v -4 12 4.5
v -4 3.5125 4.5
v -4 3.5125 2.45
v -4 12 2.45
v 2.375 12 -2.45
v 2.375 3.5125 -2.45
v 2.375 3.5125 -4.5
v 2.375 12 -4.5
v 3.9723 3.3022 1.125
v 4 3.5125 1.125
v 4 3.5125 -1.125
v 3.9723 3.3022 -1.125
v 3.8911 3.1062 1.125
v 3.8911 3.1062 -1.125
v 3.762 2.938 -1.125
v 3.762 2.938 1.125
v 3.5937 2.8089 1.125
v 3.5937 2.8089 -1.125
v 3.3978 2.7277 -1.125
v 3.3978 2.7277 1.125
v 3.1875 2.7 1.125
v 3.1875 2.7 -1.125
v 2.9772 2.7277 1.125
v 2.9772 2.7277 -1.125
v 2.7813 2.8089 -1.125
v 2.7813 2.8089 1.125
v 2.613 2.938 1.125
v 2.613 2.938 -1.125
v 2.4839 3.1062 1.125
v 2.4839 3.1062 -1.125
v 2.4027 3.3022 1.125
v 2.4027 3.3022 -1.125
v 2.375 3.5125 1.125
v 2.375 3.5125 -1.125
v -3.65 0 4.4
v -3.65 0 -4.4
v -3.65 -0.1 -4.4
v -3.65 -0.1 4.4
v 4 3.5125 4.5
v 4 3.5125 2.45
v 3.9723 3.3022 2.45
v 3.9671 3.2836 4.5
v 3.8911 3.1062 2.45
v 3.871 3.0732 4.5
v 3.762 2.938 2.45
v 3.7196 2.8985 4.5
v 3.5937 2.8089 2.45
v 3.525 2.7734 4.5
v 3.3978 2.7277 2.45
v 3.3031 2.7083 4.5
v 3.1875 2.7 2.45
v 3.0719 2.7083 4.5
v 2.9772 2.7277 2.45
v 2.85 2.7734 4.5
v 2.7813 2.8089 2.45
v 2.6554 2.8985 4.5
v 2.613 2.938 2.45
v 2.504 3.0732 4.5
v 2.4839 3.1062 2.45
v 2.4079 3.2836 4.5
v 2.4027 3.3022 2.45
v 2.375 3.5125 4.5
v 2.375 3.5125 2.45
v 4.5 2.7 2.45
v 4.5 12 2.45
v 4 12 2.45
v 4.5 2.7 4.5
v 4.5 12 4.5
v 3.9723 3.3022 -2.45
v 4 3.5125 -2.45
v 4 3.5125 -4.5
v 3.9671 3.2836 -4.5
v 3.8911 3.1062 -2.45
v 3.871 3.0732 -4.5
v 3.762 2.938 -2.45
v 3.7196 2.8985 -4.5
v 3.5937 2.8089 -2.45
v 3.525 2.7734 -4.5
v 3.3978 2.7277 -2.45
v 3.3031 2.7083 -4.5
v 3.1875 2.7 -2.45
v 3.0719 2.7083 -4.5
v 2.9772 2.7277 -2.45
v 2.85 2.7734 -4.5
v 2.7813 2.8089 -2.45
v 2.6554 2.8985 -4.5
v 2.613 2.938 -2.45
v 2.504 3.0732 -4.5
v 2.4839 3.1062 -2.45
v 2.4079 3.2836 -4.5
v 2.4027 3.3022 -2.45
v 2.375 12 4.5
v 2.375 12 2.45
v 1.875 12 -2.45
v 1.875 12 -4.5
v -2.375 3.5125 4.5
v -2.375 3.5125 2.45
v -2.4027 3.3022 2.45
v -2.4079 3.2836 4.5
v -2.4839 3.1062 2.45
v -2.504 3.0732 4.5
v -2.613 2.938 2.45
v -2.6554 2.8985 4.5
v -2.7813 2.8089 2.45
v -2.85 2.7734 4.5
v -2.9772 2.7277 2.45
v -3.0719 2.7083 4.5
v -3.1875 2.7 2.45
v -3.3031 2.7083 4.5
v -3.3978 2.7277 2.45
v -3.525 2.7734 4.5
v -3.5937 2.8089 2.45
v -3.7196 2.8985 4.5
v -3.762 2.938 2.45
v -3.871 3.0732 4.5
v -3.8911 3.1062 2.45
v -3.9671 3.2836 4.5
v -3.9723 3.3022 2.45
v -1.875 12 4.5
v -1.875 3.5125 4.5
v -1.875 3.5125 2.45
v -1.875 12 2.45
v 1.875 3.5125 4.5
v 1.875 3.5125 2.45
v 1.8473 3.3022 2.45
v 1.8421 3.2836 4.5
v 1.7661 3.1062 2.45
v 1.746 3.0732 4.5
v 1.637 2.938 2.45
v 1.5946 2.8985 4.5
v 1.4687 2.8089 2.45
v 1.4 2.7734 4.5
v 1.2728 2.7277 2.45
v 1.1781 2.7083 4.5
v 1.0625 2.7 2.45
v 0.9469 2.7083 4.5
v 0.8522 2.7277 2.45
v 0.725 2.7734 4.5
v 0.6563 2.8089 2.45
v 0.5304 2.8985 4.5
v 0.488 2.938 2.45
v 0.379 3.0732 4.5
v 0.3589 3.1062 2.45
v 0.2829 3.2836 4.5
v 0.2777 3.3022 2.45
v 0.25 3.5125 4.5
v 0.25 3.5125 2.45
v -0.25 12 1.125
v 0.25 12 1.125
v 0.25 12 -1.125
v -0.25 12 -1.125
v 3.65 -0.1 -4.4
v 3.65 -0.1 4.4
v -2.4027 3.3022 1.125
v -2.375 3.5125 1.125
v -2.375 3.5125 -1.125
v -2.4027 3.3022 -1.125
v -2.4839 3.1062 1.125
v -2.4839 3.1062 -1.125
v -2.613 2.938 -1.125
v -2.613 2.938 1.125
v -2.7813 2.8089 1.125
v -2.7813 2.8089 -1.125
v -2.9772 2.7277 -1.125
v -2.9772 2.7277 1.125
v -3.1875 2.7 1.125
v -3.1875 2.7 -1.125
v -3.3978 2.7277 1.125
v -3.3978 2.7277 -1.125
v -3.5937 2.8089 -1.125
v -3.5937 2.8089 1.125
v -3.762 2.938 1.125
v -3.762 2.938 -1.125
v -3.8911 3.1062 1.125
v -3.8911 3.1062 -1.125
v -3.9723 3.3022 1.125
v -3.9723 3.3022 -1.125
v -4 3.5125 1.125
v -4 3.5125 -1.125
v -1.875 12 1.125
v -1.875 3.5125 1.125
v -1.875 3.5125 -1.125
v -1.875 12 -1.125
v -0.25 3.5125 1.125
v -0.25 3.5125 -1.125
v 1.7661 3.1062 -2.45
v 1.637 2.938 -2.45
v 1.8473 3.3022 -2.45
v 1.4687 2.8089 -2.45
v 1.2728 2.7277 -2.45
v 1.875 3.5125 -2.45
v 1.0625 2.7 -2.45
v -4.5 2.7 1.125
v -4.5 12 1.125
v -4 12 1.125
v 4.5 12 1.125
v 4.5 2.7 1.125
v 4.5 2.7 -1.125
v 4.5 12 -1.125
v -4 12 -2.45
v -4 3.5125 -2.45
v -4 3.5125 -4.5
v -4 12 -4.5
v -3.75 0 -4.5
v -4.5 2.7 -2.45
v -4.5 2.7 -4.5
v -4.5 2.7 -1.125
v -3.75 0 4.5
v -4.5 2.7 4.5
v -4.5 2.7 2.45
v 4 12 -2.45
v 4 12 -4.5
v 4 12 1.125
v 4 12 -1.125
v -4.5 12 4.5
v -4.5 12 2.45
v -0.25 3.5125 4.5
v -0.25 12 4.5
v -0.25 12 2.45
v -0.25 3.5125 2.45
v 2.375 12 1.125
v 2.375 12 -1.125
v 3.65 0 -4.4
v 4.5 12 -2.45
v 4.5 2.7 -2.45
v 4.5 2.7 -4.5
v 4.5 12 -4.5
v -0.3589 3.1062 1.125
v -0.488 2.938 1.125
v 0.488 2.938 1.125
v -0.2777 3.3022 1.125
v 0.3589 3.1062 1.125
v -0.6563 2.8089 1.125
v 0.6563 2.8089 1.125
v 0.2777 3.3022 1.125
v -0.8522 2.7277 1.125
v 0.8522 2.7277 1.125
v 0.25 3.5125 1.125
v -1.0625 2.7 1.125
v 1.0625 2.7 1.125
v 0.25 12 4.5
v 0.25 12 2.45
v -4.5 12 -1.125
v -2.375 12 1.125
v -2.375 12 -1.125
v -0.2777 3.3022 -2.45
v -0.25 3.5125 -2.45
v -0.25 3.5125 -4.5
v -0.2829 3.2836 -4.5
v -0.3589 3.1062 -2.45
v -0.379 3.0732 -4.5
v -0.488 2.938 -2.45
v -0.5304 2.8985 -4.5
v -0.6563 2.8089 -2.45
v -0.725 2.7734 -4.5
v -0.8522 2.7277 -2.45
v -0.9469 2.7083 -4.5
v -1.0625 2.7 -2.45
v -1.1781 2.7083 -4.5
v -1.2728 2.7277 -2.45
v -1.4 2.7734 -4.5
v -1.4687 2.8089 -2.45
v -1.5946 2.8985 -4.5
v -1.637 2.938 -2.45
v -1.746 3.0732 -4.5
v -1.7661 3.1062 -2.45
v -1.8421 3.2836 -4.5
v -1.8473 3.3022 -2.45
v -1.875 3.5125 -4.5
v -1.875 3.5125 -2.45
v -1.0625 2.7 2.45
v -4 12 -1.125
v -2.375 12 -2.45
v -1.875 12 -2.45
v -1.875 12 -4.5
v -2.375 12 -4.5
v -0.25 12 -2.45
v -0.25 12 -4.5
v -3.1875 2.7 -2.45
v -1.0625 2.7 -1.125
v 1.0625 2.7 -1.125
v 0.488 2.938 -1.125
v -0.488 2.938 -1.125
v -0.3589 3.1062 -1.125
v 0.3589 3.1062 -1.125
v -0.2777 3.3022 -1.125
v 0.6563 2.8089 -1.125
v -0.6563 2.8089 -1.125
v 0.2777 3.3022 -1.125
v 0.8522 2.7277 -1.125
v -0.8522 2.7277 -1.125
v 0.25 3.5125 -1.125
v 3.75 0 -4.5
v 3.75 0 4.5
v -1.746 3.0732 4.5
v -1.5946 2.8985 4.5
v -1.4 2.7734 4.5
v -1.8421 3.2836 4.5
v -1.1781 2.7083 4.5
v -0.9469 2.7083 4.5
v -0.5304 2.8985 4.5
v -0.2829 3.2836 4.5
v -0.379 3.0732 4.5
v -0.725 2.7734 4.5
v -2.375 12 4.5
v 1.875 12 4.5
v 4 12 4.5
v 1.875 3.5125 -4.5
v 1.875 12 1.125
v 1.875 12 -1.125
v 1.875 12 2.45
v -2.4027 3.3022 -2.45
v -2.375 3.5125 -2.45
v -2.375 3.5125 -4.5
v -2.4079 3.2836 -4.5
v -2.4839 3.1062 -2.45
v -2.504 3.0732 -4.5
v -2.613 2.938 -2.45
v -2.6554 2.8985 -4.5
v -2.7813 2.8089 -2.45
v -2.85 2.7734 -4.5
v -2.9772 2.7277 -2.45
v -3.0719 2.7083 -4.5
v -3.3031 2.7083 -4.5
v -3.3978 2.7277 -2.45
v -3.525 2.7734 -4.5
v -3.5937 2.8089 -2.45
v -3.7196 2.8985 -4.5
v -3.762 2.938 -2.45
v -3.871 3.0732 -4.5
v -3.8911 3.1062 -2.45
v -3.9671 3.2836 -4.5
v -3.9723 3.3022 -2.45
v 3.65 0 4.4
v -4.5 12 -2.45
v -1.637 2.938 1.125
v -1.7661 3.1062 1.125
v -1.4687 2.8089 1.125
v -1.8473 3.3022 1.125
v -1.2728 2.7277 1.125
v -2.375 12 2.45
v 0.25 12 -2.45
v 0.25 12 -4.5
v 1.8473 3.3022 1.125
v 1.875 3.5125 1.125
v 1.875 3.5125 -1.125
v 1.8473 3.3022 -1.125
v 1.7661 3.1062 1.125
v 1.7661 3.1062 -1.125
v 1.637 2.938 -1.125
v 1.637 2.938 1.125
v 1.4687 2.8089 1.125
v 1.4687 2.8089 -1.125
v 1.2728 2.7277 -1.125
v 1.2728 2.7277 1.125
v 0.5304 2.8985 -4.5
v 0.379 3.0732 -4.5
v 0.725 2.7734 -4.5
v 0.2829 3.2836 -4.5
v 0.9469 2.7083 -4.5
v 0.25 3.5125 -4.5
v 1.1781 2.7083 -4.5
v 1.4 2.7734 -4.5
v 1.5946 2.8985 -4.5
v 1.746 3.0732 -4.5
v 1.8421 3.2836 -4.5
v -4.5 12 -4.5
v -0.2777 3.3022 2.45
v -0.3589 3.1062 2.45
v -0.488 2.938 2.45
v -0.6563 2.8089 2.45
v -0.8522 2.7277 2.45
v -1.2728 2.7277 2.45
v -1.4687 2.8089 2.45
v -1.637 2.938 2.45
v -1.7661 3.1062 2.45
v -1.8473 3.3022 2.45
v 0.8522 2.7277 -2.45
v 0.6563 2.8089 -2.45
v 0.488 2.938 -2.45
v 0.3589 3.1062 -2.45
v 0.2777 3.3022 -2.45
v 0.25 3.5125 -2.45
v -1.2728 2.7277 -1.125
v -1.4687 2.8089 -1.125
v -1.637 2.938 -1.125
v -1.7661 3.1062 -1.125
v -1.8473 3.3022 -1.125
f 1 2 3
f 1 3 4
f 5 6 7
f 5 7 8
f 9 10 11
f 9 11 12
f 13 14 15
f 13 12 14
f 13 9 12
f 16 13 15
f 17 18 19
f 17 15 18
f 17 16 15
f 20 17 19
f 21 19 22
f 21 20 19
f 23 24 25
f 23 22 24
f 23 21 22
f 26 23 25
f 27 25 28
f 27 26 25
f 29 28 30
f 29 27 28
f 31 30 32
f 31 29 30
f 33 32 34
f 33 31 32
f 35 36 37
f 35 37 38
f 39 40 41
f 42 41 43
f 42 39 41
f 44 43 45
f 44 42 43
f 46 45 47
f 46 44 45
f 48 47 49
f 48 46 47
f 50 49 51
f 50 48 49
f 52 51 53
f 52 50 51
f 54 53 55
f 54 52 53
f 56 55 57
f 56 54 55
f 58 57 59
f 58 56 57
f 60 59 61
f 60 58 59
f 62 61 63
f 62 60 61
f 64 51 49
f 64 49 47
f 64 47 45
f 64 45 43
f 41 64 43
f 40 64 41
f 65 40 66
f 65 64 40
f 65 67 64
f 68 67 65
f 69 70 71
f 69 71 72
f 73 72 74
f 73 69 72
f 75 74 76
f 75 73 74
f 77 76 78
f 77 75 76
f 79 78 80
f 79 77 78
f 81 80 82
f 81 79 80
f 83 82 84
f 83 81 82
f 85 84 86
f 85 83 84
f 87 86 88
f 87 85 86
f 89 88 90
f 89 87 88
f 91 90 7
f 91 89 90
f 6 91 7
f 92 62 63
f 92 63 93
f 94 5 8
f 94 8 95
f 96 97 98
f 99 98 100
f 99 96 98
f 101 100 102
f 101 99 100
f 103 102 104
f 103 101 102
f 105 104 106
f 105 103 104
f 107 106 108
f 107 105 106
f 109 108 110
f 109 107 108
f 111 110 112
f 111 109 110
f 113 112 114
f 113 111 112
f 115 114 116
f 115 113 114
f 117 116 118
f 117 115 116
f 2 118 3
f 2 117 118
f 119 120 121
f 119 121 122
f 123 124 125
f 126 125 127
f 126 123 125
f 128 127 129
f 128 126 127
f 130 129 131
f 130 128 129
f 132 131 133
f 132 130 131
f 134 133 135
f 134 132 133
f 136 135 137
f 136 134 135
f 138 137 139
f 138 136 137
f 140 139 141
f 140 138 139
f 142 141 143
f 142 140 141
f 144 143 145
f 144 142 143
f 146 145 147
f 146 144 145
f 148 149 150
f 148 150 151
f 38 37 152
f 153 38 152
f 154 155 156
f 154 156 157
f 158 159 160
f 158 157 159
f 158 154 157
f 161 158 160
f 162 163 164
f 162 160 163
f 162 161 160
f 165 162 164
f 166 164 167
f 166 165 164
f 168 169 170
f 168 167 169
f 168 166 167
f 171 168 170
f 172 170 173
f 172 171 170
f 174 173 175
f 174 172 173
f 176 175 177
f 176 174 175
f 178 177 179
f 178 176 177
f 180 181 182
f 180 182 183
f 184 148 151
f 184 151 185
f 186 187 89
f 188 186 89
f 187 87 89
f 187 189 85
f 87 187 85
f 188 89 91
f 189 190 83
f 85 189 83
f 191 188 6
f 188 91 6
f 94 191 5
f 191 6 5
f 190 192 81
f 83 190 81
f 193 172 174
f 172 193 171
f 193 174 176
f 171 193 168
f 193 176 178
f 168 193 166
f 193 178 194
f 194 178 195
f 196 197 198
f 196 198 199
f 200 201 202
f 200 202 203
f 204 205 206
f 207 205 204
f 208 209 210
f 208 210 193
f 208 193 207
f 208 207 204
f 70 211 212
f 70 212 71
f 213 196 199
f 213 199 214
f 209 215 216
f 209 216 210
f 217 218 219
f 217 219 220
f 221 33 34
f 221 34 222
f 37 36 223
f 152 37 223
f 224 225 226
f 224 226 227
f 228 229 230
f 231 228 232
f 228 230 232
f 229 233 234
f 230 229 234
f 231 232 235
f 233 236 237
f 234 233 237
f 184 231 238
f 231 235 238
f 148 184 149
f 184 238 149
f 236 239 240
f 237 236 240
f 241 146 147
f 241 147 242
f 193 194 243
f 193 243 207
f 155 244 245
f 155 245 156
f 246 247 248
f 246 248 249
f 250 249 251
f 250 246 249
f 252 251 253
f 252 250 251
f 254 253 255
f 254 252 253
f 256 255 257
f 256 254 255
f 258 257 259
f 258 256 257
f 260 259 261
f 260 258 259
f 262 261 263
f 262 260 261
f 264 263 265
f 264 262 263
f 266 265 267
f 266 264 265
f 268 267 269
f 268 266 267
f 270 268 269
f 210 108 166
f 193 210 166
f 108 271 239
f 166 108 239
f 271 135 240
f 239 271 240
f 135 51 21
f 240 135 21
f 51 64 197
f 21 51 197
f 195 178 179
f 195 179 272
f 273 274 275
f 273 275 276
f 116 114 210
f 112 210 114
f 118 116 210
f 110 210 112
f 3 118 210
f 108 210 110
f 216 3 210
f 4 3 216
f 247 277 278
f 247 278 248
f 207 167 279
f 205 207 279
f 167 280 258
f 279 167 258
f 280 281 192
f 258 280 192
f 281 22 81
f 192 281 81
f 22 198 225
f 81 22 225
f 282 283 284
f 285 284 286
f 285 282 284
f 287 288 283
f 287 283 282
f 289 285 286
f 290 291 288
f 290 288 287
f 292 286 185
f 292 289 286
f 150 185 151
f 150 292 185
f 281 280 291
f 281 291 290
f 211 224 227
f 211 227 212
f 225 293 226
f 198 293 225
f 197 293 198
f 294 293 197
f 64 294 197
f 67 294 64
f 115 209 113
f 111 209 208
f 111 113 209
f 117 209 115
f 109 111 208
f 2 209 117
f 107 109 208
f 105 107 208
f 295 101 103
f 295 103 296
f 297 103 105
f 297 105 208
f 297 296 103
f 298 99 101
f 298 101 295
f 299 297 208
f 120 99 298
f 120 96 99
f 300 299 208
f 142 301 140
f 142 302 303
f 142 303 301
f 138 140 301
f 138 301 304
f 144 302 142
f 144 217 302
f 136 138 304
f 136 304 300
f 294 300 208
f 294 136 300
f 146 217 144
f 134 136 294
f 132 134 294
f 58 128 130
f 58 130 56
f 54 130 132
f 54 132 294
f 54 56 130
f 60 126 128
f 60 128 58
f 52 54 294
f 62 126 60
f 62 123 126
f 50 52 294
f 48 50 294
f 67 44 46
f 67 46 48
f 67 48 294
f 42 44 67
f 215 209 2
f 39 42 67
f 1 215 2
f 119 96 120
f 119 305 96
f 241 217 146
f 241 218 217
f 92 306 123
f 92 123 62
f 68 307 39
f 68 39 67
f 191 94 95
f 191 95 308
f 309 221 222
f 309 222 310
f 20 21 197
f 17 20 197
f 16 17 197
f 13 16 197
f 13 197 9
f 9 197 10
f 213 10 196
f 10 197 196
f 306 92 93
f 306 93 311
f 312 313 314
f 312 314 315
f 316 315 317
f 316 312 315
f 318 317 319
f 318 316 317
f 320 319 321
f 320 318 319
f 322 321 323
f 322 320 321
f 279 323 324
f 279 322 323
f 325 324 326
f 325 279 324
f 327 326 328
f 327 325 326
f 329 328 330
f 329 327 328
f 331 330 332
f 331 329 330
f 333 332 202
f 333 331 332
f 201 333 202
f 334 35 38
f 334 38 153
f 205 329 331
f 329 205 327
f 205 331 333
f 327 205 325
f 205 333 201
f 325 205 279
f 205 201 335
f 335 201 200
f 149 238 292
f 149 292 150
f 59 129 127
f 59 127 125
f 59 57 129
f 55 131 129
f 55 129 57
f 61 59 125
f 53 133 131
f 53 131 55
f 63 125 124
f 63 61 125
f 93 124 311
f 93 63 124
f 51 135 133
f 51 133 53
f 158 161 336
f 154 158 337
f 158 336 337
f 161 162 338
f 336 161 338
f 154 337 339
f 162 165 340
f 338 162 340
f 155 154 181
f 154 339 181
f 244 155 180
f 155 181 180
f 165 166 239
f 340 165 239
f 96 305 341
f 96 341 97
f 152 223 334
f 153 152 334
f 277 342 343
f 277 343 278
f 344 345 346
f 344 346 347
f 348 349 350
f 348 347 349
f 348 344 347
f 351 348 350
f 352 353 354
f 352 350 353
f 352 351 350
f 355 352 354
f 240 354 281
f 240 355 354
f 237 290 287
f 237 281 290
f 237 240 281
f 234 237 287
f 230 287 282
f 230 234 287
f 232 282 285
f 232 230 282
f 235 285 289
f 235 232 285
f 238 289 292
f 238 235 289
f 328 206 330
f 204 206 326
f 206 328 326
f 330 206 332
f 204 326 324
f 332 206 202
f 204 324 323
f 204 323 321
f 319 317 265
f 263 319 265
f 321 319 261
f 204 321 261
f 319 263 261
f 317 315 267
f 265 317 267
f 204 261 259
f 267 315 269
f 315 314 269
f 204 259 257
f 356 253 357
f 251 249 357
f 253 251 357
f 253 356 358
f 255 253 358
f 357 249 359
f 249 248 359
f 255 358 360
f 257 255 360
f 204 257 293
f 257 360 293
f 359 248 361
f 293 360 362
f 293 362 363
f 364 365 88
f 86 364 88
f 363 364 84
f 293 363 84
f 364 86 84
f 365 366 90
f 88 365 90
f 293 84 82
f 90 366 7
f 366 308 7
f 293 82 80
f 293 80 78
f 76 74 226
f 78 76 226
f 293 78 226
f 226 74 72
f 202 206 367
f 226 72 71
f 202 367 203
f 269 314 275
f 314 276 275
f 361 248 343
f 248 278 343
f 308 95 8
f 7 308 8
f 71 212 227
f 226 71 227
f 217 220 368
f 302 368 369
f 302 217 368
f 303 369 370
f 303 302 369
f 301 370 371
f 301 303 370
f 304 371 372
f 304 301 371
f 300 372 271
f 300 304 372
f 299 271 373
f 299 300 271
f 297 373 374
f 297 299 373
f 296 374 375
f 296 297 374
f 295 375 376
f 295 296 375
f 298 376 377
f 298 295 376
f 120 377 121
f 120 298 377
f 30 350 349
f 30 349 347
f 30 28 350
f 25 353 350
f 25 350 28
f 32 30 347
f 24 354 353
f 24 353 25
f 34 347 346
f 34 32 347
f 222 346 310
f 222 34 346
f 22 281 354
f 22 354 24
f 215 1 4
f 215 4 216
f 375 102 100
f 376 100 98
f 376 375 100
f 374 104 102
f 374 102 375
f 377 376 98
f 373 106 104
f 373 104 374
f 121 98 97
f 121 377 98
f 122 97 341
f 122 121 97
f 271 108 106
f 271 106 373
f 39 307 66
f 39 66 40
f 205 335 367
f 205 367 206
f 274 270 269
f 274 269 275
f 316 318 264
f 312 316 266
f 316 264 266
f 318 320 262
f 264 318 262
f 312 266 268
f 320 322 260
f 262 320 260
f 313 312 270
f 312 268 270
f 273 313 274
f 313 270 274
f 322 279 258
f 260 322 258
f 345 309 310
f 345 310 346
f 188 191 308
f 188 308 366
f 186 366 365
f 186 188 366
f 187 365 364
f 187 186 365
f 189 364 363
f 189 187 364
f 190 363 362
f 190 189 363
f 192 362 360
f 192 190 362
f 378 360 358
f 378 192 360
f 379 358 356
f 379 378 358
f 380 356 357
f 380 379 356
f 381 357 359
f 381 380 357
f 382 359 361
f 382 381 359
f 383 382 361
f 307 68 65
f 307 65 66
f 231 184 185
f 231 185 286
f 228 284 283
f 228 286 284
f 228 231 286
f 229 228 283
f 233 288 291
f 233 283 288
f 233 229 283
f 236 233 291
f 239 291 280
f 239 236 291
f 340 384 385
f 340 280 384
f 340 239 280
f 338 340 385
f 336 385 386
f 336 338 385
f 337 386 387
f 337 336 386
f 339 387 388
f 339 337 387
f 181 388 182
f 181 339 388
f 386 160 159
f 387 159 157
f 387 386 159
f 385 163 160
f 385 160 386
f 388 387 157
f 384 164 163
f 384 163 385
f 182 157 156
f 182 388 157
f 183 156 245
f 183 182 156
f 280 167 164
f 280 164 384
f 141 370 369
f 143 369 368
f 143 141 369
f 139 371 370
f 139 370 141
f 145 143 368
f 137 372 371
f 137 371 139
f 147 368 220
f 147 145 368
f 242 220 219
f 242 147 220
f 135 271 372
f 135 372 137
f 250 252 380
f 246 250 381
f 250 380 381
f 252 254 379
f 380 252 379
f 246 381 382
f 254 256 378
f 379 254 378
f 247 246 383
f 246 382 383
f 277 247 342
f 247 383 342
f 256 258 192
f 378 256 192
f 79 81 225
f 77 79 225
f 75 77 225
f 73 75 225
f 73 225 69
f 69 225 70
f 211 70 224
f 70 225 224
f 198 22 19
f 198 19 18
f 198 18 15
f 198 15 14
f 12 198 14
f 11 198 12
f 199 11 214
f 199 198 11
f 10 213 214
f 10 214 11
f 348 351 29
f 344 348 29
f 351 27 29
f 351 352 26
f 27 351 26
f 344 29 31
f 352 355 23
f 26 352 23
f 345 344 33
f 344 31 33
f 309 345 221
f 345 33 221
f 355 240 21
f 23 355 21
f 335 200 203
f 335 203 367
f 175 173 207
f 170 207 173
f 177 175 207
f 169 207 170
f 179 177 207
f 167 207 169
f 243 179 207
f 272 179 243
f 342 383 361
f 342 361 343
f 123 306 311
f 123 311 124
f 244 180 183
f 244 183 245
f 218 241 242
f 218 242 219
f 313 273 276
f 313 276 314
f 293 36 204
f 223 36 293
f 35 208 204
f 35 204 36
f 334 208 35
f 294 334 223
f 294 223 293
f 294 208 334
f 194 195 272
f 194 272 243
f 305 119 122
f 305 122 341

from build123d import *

# Parameters (mm, degrees)
AUFSATZ_LINEAR_AUSTRAGEN1_DEPTH = 4.5
SCHNITT_LINEAR_AUSTRAGEN1_DEPTH = 9
SCHNITT_LINEAR_AUSTRAGEN2_REACH = 17.66
SKIZZE3_W                       = 1.325
SKIZZE3_H                       = 9.3
SKIZZE4_W                       = 7.3
SKIZZE4_H                       = 8.8
AUFSATZ_LINEAR_AUSTRAGEN2_DEPTH = 0.1


with BuildPart() as part:
    # Skizze1 → Aufsatz-Linear austragen1 (new, symmetric)
    with BuildSketch(Plane.XY):
        Polygon((-4.5, 12), (-4.5, 2.7), (-3.75, 0), (3.75, 0), (4.5, 2.7), (4.5, 12), align=None)
    extrude(amount=AUFSATZ_LINEAR_AUSTRAGEN1_DEPTH, both=True)

    # Skizze2 → Schnitt-Linear austragen1 (cut)
    with BuildSketch(Plane.XY.offset(4.5)):
        with BuildLine():
            Line((-2.375, 12), (-2.375, 3.5125))
            ThreePointArc((-2.375, 3.5125), (-3.1875, 2.7), (-4, 3.5125))
            Line((-4, 3.5125), (-4, 12))
            ThreePointArc((-4, 12), (-3.1875, 12.8125), (-2.375, 12))
        make_face()
        with BuildLine():
            Line((-0.25, 12), (-0.25, 3.5125))
            ThreePointArc((-0.25, 3.5125), (-1.0625, 2.7), (-1.875, 3.5125))
            Line((-1.875, 3.5125), (-1.875, 12))
            ThreePointArc((-1.875, 12), (-1.0625, 12.8125), (-0.25, 12))
        make_face()
        with BuildLine():
            Line((1.875, 12), (1.875, 3.5125))
            ThreePointArc((1.875, 3.5125), (1.0625, 2.7), (0.25, 3.5125))
            Line((0.25, 3.5125), (0.25, 12))
            ThreePointArc((0.25, 12), (1.0625, 12.8125), (1.875, 12))
        make_face()
        with BuildLine():
            Line((4, 12), (4, 3.5125))
            ThreePointArc((4, 3.5125), (3.1875, 2.7), (2.375, 3.5125))
            Line((2.375, 3.5125), (2.375, 12))
            ThreePointArc((2.375, 12), (3.1875, 12.8125), (4, 12))
        make_face()
    extrude(amount=-SCHNITT_LINEAR_AUSTRAGEN1_DEPTH, mode=Mode.SUBTRACT)

    # Schnitt-Linear austragen2: up to this face of the body (flat: up to its plane)
    schnitt_linear_austragen2_end = Plane(part.part.faces().sort_by_distance((-4.5, 7.35, 0))[0])
    # Skizze3 → Schnitt-Linear austragen2 (cut, up to the picked face)
    with BuildSketch(Plane(origin=(4.5, 0, 0), x_dir=(0, 0, -1), z_dir=(1, 0, 0)), mode=Mode.PRIVATE) as schnitt_linear_austragen2_sk1:
        with Locations((-1.7875, 7.35)):
            Rectangle(SKIZZE3_W, SKIZZE3_H)
    schnitt_linear_austragen2_tool1 = split(extrude(schnitt_linear_austragen2_sk1.sketch, amount=-SCHNITT_LINEAR_AUSTRAGEN2_REACH, mode=Mode.PRIVATE), bisect_by=schnitt_linear_austragen2_end, keep=Keep.BOTH, mode=Mode.PRIVATE)
    # Skizze3 → Schnitt-Linear austragen2 (cut, up to the picked face)
    with BuildSketch(Plane(origin=(4.5, 0, 0), x_dir=(0, 0, -1), z_dir=(1, 0, 0)), mode=Mode.PRIVATE) as schnitt_linear_austragen2_sk2:
        with Locations((1.7875, 7.35)):
            Rectangle(SKIZZE3_W, SKIZZE3_H)
    schnitt_linear_austragen2_tool2 = split(extrude(schnitt_linear_austragen2_sk2.sketch, amount=-SCHNITT_LINEAR_AUSTRAGEN2_REACH, mode=Mode.PRIVATE), bisect_by=schnitt_linear_austragen2_end, keep=Keep.BOTH, mode=Mode.PRIVATE)
    add(schnitt_linear_austragen2_tool1.solids().sort_by(Axis((4.5, 7.35, 1.7875), (-1, 0, 0)))[0], mode=Mode.SUBTRACT)
    add(schnitt_linear_austragen2_tool2.solids().sort_by(Axis((4.5, 7.35, -1.7875), (-1, 0, 0)))[0], mode=Mode.SUBTRACT)

    # Skizze4 → Aufsatz-Linear austragen2 (add)
    with BuildSketch(Plane.XZ):
        Rectangle(SKIZZE4_W, SKIZZE4_H)
    extrude(amount=AUFSATZ_LINEAR_AUSTRAGEN2_DEPTH)


solid = part.part
